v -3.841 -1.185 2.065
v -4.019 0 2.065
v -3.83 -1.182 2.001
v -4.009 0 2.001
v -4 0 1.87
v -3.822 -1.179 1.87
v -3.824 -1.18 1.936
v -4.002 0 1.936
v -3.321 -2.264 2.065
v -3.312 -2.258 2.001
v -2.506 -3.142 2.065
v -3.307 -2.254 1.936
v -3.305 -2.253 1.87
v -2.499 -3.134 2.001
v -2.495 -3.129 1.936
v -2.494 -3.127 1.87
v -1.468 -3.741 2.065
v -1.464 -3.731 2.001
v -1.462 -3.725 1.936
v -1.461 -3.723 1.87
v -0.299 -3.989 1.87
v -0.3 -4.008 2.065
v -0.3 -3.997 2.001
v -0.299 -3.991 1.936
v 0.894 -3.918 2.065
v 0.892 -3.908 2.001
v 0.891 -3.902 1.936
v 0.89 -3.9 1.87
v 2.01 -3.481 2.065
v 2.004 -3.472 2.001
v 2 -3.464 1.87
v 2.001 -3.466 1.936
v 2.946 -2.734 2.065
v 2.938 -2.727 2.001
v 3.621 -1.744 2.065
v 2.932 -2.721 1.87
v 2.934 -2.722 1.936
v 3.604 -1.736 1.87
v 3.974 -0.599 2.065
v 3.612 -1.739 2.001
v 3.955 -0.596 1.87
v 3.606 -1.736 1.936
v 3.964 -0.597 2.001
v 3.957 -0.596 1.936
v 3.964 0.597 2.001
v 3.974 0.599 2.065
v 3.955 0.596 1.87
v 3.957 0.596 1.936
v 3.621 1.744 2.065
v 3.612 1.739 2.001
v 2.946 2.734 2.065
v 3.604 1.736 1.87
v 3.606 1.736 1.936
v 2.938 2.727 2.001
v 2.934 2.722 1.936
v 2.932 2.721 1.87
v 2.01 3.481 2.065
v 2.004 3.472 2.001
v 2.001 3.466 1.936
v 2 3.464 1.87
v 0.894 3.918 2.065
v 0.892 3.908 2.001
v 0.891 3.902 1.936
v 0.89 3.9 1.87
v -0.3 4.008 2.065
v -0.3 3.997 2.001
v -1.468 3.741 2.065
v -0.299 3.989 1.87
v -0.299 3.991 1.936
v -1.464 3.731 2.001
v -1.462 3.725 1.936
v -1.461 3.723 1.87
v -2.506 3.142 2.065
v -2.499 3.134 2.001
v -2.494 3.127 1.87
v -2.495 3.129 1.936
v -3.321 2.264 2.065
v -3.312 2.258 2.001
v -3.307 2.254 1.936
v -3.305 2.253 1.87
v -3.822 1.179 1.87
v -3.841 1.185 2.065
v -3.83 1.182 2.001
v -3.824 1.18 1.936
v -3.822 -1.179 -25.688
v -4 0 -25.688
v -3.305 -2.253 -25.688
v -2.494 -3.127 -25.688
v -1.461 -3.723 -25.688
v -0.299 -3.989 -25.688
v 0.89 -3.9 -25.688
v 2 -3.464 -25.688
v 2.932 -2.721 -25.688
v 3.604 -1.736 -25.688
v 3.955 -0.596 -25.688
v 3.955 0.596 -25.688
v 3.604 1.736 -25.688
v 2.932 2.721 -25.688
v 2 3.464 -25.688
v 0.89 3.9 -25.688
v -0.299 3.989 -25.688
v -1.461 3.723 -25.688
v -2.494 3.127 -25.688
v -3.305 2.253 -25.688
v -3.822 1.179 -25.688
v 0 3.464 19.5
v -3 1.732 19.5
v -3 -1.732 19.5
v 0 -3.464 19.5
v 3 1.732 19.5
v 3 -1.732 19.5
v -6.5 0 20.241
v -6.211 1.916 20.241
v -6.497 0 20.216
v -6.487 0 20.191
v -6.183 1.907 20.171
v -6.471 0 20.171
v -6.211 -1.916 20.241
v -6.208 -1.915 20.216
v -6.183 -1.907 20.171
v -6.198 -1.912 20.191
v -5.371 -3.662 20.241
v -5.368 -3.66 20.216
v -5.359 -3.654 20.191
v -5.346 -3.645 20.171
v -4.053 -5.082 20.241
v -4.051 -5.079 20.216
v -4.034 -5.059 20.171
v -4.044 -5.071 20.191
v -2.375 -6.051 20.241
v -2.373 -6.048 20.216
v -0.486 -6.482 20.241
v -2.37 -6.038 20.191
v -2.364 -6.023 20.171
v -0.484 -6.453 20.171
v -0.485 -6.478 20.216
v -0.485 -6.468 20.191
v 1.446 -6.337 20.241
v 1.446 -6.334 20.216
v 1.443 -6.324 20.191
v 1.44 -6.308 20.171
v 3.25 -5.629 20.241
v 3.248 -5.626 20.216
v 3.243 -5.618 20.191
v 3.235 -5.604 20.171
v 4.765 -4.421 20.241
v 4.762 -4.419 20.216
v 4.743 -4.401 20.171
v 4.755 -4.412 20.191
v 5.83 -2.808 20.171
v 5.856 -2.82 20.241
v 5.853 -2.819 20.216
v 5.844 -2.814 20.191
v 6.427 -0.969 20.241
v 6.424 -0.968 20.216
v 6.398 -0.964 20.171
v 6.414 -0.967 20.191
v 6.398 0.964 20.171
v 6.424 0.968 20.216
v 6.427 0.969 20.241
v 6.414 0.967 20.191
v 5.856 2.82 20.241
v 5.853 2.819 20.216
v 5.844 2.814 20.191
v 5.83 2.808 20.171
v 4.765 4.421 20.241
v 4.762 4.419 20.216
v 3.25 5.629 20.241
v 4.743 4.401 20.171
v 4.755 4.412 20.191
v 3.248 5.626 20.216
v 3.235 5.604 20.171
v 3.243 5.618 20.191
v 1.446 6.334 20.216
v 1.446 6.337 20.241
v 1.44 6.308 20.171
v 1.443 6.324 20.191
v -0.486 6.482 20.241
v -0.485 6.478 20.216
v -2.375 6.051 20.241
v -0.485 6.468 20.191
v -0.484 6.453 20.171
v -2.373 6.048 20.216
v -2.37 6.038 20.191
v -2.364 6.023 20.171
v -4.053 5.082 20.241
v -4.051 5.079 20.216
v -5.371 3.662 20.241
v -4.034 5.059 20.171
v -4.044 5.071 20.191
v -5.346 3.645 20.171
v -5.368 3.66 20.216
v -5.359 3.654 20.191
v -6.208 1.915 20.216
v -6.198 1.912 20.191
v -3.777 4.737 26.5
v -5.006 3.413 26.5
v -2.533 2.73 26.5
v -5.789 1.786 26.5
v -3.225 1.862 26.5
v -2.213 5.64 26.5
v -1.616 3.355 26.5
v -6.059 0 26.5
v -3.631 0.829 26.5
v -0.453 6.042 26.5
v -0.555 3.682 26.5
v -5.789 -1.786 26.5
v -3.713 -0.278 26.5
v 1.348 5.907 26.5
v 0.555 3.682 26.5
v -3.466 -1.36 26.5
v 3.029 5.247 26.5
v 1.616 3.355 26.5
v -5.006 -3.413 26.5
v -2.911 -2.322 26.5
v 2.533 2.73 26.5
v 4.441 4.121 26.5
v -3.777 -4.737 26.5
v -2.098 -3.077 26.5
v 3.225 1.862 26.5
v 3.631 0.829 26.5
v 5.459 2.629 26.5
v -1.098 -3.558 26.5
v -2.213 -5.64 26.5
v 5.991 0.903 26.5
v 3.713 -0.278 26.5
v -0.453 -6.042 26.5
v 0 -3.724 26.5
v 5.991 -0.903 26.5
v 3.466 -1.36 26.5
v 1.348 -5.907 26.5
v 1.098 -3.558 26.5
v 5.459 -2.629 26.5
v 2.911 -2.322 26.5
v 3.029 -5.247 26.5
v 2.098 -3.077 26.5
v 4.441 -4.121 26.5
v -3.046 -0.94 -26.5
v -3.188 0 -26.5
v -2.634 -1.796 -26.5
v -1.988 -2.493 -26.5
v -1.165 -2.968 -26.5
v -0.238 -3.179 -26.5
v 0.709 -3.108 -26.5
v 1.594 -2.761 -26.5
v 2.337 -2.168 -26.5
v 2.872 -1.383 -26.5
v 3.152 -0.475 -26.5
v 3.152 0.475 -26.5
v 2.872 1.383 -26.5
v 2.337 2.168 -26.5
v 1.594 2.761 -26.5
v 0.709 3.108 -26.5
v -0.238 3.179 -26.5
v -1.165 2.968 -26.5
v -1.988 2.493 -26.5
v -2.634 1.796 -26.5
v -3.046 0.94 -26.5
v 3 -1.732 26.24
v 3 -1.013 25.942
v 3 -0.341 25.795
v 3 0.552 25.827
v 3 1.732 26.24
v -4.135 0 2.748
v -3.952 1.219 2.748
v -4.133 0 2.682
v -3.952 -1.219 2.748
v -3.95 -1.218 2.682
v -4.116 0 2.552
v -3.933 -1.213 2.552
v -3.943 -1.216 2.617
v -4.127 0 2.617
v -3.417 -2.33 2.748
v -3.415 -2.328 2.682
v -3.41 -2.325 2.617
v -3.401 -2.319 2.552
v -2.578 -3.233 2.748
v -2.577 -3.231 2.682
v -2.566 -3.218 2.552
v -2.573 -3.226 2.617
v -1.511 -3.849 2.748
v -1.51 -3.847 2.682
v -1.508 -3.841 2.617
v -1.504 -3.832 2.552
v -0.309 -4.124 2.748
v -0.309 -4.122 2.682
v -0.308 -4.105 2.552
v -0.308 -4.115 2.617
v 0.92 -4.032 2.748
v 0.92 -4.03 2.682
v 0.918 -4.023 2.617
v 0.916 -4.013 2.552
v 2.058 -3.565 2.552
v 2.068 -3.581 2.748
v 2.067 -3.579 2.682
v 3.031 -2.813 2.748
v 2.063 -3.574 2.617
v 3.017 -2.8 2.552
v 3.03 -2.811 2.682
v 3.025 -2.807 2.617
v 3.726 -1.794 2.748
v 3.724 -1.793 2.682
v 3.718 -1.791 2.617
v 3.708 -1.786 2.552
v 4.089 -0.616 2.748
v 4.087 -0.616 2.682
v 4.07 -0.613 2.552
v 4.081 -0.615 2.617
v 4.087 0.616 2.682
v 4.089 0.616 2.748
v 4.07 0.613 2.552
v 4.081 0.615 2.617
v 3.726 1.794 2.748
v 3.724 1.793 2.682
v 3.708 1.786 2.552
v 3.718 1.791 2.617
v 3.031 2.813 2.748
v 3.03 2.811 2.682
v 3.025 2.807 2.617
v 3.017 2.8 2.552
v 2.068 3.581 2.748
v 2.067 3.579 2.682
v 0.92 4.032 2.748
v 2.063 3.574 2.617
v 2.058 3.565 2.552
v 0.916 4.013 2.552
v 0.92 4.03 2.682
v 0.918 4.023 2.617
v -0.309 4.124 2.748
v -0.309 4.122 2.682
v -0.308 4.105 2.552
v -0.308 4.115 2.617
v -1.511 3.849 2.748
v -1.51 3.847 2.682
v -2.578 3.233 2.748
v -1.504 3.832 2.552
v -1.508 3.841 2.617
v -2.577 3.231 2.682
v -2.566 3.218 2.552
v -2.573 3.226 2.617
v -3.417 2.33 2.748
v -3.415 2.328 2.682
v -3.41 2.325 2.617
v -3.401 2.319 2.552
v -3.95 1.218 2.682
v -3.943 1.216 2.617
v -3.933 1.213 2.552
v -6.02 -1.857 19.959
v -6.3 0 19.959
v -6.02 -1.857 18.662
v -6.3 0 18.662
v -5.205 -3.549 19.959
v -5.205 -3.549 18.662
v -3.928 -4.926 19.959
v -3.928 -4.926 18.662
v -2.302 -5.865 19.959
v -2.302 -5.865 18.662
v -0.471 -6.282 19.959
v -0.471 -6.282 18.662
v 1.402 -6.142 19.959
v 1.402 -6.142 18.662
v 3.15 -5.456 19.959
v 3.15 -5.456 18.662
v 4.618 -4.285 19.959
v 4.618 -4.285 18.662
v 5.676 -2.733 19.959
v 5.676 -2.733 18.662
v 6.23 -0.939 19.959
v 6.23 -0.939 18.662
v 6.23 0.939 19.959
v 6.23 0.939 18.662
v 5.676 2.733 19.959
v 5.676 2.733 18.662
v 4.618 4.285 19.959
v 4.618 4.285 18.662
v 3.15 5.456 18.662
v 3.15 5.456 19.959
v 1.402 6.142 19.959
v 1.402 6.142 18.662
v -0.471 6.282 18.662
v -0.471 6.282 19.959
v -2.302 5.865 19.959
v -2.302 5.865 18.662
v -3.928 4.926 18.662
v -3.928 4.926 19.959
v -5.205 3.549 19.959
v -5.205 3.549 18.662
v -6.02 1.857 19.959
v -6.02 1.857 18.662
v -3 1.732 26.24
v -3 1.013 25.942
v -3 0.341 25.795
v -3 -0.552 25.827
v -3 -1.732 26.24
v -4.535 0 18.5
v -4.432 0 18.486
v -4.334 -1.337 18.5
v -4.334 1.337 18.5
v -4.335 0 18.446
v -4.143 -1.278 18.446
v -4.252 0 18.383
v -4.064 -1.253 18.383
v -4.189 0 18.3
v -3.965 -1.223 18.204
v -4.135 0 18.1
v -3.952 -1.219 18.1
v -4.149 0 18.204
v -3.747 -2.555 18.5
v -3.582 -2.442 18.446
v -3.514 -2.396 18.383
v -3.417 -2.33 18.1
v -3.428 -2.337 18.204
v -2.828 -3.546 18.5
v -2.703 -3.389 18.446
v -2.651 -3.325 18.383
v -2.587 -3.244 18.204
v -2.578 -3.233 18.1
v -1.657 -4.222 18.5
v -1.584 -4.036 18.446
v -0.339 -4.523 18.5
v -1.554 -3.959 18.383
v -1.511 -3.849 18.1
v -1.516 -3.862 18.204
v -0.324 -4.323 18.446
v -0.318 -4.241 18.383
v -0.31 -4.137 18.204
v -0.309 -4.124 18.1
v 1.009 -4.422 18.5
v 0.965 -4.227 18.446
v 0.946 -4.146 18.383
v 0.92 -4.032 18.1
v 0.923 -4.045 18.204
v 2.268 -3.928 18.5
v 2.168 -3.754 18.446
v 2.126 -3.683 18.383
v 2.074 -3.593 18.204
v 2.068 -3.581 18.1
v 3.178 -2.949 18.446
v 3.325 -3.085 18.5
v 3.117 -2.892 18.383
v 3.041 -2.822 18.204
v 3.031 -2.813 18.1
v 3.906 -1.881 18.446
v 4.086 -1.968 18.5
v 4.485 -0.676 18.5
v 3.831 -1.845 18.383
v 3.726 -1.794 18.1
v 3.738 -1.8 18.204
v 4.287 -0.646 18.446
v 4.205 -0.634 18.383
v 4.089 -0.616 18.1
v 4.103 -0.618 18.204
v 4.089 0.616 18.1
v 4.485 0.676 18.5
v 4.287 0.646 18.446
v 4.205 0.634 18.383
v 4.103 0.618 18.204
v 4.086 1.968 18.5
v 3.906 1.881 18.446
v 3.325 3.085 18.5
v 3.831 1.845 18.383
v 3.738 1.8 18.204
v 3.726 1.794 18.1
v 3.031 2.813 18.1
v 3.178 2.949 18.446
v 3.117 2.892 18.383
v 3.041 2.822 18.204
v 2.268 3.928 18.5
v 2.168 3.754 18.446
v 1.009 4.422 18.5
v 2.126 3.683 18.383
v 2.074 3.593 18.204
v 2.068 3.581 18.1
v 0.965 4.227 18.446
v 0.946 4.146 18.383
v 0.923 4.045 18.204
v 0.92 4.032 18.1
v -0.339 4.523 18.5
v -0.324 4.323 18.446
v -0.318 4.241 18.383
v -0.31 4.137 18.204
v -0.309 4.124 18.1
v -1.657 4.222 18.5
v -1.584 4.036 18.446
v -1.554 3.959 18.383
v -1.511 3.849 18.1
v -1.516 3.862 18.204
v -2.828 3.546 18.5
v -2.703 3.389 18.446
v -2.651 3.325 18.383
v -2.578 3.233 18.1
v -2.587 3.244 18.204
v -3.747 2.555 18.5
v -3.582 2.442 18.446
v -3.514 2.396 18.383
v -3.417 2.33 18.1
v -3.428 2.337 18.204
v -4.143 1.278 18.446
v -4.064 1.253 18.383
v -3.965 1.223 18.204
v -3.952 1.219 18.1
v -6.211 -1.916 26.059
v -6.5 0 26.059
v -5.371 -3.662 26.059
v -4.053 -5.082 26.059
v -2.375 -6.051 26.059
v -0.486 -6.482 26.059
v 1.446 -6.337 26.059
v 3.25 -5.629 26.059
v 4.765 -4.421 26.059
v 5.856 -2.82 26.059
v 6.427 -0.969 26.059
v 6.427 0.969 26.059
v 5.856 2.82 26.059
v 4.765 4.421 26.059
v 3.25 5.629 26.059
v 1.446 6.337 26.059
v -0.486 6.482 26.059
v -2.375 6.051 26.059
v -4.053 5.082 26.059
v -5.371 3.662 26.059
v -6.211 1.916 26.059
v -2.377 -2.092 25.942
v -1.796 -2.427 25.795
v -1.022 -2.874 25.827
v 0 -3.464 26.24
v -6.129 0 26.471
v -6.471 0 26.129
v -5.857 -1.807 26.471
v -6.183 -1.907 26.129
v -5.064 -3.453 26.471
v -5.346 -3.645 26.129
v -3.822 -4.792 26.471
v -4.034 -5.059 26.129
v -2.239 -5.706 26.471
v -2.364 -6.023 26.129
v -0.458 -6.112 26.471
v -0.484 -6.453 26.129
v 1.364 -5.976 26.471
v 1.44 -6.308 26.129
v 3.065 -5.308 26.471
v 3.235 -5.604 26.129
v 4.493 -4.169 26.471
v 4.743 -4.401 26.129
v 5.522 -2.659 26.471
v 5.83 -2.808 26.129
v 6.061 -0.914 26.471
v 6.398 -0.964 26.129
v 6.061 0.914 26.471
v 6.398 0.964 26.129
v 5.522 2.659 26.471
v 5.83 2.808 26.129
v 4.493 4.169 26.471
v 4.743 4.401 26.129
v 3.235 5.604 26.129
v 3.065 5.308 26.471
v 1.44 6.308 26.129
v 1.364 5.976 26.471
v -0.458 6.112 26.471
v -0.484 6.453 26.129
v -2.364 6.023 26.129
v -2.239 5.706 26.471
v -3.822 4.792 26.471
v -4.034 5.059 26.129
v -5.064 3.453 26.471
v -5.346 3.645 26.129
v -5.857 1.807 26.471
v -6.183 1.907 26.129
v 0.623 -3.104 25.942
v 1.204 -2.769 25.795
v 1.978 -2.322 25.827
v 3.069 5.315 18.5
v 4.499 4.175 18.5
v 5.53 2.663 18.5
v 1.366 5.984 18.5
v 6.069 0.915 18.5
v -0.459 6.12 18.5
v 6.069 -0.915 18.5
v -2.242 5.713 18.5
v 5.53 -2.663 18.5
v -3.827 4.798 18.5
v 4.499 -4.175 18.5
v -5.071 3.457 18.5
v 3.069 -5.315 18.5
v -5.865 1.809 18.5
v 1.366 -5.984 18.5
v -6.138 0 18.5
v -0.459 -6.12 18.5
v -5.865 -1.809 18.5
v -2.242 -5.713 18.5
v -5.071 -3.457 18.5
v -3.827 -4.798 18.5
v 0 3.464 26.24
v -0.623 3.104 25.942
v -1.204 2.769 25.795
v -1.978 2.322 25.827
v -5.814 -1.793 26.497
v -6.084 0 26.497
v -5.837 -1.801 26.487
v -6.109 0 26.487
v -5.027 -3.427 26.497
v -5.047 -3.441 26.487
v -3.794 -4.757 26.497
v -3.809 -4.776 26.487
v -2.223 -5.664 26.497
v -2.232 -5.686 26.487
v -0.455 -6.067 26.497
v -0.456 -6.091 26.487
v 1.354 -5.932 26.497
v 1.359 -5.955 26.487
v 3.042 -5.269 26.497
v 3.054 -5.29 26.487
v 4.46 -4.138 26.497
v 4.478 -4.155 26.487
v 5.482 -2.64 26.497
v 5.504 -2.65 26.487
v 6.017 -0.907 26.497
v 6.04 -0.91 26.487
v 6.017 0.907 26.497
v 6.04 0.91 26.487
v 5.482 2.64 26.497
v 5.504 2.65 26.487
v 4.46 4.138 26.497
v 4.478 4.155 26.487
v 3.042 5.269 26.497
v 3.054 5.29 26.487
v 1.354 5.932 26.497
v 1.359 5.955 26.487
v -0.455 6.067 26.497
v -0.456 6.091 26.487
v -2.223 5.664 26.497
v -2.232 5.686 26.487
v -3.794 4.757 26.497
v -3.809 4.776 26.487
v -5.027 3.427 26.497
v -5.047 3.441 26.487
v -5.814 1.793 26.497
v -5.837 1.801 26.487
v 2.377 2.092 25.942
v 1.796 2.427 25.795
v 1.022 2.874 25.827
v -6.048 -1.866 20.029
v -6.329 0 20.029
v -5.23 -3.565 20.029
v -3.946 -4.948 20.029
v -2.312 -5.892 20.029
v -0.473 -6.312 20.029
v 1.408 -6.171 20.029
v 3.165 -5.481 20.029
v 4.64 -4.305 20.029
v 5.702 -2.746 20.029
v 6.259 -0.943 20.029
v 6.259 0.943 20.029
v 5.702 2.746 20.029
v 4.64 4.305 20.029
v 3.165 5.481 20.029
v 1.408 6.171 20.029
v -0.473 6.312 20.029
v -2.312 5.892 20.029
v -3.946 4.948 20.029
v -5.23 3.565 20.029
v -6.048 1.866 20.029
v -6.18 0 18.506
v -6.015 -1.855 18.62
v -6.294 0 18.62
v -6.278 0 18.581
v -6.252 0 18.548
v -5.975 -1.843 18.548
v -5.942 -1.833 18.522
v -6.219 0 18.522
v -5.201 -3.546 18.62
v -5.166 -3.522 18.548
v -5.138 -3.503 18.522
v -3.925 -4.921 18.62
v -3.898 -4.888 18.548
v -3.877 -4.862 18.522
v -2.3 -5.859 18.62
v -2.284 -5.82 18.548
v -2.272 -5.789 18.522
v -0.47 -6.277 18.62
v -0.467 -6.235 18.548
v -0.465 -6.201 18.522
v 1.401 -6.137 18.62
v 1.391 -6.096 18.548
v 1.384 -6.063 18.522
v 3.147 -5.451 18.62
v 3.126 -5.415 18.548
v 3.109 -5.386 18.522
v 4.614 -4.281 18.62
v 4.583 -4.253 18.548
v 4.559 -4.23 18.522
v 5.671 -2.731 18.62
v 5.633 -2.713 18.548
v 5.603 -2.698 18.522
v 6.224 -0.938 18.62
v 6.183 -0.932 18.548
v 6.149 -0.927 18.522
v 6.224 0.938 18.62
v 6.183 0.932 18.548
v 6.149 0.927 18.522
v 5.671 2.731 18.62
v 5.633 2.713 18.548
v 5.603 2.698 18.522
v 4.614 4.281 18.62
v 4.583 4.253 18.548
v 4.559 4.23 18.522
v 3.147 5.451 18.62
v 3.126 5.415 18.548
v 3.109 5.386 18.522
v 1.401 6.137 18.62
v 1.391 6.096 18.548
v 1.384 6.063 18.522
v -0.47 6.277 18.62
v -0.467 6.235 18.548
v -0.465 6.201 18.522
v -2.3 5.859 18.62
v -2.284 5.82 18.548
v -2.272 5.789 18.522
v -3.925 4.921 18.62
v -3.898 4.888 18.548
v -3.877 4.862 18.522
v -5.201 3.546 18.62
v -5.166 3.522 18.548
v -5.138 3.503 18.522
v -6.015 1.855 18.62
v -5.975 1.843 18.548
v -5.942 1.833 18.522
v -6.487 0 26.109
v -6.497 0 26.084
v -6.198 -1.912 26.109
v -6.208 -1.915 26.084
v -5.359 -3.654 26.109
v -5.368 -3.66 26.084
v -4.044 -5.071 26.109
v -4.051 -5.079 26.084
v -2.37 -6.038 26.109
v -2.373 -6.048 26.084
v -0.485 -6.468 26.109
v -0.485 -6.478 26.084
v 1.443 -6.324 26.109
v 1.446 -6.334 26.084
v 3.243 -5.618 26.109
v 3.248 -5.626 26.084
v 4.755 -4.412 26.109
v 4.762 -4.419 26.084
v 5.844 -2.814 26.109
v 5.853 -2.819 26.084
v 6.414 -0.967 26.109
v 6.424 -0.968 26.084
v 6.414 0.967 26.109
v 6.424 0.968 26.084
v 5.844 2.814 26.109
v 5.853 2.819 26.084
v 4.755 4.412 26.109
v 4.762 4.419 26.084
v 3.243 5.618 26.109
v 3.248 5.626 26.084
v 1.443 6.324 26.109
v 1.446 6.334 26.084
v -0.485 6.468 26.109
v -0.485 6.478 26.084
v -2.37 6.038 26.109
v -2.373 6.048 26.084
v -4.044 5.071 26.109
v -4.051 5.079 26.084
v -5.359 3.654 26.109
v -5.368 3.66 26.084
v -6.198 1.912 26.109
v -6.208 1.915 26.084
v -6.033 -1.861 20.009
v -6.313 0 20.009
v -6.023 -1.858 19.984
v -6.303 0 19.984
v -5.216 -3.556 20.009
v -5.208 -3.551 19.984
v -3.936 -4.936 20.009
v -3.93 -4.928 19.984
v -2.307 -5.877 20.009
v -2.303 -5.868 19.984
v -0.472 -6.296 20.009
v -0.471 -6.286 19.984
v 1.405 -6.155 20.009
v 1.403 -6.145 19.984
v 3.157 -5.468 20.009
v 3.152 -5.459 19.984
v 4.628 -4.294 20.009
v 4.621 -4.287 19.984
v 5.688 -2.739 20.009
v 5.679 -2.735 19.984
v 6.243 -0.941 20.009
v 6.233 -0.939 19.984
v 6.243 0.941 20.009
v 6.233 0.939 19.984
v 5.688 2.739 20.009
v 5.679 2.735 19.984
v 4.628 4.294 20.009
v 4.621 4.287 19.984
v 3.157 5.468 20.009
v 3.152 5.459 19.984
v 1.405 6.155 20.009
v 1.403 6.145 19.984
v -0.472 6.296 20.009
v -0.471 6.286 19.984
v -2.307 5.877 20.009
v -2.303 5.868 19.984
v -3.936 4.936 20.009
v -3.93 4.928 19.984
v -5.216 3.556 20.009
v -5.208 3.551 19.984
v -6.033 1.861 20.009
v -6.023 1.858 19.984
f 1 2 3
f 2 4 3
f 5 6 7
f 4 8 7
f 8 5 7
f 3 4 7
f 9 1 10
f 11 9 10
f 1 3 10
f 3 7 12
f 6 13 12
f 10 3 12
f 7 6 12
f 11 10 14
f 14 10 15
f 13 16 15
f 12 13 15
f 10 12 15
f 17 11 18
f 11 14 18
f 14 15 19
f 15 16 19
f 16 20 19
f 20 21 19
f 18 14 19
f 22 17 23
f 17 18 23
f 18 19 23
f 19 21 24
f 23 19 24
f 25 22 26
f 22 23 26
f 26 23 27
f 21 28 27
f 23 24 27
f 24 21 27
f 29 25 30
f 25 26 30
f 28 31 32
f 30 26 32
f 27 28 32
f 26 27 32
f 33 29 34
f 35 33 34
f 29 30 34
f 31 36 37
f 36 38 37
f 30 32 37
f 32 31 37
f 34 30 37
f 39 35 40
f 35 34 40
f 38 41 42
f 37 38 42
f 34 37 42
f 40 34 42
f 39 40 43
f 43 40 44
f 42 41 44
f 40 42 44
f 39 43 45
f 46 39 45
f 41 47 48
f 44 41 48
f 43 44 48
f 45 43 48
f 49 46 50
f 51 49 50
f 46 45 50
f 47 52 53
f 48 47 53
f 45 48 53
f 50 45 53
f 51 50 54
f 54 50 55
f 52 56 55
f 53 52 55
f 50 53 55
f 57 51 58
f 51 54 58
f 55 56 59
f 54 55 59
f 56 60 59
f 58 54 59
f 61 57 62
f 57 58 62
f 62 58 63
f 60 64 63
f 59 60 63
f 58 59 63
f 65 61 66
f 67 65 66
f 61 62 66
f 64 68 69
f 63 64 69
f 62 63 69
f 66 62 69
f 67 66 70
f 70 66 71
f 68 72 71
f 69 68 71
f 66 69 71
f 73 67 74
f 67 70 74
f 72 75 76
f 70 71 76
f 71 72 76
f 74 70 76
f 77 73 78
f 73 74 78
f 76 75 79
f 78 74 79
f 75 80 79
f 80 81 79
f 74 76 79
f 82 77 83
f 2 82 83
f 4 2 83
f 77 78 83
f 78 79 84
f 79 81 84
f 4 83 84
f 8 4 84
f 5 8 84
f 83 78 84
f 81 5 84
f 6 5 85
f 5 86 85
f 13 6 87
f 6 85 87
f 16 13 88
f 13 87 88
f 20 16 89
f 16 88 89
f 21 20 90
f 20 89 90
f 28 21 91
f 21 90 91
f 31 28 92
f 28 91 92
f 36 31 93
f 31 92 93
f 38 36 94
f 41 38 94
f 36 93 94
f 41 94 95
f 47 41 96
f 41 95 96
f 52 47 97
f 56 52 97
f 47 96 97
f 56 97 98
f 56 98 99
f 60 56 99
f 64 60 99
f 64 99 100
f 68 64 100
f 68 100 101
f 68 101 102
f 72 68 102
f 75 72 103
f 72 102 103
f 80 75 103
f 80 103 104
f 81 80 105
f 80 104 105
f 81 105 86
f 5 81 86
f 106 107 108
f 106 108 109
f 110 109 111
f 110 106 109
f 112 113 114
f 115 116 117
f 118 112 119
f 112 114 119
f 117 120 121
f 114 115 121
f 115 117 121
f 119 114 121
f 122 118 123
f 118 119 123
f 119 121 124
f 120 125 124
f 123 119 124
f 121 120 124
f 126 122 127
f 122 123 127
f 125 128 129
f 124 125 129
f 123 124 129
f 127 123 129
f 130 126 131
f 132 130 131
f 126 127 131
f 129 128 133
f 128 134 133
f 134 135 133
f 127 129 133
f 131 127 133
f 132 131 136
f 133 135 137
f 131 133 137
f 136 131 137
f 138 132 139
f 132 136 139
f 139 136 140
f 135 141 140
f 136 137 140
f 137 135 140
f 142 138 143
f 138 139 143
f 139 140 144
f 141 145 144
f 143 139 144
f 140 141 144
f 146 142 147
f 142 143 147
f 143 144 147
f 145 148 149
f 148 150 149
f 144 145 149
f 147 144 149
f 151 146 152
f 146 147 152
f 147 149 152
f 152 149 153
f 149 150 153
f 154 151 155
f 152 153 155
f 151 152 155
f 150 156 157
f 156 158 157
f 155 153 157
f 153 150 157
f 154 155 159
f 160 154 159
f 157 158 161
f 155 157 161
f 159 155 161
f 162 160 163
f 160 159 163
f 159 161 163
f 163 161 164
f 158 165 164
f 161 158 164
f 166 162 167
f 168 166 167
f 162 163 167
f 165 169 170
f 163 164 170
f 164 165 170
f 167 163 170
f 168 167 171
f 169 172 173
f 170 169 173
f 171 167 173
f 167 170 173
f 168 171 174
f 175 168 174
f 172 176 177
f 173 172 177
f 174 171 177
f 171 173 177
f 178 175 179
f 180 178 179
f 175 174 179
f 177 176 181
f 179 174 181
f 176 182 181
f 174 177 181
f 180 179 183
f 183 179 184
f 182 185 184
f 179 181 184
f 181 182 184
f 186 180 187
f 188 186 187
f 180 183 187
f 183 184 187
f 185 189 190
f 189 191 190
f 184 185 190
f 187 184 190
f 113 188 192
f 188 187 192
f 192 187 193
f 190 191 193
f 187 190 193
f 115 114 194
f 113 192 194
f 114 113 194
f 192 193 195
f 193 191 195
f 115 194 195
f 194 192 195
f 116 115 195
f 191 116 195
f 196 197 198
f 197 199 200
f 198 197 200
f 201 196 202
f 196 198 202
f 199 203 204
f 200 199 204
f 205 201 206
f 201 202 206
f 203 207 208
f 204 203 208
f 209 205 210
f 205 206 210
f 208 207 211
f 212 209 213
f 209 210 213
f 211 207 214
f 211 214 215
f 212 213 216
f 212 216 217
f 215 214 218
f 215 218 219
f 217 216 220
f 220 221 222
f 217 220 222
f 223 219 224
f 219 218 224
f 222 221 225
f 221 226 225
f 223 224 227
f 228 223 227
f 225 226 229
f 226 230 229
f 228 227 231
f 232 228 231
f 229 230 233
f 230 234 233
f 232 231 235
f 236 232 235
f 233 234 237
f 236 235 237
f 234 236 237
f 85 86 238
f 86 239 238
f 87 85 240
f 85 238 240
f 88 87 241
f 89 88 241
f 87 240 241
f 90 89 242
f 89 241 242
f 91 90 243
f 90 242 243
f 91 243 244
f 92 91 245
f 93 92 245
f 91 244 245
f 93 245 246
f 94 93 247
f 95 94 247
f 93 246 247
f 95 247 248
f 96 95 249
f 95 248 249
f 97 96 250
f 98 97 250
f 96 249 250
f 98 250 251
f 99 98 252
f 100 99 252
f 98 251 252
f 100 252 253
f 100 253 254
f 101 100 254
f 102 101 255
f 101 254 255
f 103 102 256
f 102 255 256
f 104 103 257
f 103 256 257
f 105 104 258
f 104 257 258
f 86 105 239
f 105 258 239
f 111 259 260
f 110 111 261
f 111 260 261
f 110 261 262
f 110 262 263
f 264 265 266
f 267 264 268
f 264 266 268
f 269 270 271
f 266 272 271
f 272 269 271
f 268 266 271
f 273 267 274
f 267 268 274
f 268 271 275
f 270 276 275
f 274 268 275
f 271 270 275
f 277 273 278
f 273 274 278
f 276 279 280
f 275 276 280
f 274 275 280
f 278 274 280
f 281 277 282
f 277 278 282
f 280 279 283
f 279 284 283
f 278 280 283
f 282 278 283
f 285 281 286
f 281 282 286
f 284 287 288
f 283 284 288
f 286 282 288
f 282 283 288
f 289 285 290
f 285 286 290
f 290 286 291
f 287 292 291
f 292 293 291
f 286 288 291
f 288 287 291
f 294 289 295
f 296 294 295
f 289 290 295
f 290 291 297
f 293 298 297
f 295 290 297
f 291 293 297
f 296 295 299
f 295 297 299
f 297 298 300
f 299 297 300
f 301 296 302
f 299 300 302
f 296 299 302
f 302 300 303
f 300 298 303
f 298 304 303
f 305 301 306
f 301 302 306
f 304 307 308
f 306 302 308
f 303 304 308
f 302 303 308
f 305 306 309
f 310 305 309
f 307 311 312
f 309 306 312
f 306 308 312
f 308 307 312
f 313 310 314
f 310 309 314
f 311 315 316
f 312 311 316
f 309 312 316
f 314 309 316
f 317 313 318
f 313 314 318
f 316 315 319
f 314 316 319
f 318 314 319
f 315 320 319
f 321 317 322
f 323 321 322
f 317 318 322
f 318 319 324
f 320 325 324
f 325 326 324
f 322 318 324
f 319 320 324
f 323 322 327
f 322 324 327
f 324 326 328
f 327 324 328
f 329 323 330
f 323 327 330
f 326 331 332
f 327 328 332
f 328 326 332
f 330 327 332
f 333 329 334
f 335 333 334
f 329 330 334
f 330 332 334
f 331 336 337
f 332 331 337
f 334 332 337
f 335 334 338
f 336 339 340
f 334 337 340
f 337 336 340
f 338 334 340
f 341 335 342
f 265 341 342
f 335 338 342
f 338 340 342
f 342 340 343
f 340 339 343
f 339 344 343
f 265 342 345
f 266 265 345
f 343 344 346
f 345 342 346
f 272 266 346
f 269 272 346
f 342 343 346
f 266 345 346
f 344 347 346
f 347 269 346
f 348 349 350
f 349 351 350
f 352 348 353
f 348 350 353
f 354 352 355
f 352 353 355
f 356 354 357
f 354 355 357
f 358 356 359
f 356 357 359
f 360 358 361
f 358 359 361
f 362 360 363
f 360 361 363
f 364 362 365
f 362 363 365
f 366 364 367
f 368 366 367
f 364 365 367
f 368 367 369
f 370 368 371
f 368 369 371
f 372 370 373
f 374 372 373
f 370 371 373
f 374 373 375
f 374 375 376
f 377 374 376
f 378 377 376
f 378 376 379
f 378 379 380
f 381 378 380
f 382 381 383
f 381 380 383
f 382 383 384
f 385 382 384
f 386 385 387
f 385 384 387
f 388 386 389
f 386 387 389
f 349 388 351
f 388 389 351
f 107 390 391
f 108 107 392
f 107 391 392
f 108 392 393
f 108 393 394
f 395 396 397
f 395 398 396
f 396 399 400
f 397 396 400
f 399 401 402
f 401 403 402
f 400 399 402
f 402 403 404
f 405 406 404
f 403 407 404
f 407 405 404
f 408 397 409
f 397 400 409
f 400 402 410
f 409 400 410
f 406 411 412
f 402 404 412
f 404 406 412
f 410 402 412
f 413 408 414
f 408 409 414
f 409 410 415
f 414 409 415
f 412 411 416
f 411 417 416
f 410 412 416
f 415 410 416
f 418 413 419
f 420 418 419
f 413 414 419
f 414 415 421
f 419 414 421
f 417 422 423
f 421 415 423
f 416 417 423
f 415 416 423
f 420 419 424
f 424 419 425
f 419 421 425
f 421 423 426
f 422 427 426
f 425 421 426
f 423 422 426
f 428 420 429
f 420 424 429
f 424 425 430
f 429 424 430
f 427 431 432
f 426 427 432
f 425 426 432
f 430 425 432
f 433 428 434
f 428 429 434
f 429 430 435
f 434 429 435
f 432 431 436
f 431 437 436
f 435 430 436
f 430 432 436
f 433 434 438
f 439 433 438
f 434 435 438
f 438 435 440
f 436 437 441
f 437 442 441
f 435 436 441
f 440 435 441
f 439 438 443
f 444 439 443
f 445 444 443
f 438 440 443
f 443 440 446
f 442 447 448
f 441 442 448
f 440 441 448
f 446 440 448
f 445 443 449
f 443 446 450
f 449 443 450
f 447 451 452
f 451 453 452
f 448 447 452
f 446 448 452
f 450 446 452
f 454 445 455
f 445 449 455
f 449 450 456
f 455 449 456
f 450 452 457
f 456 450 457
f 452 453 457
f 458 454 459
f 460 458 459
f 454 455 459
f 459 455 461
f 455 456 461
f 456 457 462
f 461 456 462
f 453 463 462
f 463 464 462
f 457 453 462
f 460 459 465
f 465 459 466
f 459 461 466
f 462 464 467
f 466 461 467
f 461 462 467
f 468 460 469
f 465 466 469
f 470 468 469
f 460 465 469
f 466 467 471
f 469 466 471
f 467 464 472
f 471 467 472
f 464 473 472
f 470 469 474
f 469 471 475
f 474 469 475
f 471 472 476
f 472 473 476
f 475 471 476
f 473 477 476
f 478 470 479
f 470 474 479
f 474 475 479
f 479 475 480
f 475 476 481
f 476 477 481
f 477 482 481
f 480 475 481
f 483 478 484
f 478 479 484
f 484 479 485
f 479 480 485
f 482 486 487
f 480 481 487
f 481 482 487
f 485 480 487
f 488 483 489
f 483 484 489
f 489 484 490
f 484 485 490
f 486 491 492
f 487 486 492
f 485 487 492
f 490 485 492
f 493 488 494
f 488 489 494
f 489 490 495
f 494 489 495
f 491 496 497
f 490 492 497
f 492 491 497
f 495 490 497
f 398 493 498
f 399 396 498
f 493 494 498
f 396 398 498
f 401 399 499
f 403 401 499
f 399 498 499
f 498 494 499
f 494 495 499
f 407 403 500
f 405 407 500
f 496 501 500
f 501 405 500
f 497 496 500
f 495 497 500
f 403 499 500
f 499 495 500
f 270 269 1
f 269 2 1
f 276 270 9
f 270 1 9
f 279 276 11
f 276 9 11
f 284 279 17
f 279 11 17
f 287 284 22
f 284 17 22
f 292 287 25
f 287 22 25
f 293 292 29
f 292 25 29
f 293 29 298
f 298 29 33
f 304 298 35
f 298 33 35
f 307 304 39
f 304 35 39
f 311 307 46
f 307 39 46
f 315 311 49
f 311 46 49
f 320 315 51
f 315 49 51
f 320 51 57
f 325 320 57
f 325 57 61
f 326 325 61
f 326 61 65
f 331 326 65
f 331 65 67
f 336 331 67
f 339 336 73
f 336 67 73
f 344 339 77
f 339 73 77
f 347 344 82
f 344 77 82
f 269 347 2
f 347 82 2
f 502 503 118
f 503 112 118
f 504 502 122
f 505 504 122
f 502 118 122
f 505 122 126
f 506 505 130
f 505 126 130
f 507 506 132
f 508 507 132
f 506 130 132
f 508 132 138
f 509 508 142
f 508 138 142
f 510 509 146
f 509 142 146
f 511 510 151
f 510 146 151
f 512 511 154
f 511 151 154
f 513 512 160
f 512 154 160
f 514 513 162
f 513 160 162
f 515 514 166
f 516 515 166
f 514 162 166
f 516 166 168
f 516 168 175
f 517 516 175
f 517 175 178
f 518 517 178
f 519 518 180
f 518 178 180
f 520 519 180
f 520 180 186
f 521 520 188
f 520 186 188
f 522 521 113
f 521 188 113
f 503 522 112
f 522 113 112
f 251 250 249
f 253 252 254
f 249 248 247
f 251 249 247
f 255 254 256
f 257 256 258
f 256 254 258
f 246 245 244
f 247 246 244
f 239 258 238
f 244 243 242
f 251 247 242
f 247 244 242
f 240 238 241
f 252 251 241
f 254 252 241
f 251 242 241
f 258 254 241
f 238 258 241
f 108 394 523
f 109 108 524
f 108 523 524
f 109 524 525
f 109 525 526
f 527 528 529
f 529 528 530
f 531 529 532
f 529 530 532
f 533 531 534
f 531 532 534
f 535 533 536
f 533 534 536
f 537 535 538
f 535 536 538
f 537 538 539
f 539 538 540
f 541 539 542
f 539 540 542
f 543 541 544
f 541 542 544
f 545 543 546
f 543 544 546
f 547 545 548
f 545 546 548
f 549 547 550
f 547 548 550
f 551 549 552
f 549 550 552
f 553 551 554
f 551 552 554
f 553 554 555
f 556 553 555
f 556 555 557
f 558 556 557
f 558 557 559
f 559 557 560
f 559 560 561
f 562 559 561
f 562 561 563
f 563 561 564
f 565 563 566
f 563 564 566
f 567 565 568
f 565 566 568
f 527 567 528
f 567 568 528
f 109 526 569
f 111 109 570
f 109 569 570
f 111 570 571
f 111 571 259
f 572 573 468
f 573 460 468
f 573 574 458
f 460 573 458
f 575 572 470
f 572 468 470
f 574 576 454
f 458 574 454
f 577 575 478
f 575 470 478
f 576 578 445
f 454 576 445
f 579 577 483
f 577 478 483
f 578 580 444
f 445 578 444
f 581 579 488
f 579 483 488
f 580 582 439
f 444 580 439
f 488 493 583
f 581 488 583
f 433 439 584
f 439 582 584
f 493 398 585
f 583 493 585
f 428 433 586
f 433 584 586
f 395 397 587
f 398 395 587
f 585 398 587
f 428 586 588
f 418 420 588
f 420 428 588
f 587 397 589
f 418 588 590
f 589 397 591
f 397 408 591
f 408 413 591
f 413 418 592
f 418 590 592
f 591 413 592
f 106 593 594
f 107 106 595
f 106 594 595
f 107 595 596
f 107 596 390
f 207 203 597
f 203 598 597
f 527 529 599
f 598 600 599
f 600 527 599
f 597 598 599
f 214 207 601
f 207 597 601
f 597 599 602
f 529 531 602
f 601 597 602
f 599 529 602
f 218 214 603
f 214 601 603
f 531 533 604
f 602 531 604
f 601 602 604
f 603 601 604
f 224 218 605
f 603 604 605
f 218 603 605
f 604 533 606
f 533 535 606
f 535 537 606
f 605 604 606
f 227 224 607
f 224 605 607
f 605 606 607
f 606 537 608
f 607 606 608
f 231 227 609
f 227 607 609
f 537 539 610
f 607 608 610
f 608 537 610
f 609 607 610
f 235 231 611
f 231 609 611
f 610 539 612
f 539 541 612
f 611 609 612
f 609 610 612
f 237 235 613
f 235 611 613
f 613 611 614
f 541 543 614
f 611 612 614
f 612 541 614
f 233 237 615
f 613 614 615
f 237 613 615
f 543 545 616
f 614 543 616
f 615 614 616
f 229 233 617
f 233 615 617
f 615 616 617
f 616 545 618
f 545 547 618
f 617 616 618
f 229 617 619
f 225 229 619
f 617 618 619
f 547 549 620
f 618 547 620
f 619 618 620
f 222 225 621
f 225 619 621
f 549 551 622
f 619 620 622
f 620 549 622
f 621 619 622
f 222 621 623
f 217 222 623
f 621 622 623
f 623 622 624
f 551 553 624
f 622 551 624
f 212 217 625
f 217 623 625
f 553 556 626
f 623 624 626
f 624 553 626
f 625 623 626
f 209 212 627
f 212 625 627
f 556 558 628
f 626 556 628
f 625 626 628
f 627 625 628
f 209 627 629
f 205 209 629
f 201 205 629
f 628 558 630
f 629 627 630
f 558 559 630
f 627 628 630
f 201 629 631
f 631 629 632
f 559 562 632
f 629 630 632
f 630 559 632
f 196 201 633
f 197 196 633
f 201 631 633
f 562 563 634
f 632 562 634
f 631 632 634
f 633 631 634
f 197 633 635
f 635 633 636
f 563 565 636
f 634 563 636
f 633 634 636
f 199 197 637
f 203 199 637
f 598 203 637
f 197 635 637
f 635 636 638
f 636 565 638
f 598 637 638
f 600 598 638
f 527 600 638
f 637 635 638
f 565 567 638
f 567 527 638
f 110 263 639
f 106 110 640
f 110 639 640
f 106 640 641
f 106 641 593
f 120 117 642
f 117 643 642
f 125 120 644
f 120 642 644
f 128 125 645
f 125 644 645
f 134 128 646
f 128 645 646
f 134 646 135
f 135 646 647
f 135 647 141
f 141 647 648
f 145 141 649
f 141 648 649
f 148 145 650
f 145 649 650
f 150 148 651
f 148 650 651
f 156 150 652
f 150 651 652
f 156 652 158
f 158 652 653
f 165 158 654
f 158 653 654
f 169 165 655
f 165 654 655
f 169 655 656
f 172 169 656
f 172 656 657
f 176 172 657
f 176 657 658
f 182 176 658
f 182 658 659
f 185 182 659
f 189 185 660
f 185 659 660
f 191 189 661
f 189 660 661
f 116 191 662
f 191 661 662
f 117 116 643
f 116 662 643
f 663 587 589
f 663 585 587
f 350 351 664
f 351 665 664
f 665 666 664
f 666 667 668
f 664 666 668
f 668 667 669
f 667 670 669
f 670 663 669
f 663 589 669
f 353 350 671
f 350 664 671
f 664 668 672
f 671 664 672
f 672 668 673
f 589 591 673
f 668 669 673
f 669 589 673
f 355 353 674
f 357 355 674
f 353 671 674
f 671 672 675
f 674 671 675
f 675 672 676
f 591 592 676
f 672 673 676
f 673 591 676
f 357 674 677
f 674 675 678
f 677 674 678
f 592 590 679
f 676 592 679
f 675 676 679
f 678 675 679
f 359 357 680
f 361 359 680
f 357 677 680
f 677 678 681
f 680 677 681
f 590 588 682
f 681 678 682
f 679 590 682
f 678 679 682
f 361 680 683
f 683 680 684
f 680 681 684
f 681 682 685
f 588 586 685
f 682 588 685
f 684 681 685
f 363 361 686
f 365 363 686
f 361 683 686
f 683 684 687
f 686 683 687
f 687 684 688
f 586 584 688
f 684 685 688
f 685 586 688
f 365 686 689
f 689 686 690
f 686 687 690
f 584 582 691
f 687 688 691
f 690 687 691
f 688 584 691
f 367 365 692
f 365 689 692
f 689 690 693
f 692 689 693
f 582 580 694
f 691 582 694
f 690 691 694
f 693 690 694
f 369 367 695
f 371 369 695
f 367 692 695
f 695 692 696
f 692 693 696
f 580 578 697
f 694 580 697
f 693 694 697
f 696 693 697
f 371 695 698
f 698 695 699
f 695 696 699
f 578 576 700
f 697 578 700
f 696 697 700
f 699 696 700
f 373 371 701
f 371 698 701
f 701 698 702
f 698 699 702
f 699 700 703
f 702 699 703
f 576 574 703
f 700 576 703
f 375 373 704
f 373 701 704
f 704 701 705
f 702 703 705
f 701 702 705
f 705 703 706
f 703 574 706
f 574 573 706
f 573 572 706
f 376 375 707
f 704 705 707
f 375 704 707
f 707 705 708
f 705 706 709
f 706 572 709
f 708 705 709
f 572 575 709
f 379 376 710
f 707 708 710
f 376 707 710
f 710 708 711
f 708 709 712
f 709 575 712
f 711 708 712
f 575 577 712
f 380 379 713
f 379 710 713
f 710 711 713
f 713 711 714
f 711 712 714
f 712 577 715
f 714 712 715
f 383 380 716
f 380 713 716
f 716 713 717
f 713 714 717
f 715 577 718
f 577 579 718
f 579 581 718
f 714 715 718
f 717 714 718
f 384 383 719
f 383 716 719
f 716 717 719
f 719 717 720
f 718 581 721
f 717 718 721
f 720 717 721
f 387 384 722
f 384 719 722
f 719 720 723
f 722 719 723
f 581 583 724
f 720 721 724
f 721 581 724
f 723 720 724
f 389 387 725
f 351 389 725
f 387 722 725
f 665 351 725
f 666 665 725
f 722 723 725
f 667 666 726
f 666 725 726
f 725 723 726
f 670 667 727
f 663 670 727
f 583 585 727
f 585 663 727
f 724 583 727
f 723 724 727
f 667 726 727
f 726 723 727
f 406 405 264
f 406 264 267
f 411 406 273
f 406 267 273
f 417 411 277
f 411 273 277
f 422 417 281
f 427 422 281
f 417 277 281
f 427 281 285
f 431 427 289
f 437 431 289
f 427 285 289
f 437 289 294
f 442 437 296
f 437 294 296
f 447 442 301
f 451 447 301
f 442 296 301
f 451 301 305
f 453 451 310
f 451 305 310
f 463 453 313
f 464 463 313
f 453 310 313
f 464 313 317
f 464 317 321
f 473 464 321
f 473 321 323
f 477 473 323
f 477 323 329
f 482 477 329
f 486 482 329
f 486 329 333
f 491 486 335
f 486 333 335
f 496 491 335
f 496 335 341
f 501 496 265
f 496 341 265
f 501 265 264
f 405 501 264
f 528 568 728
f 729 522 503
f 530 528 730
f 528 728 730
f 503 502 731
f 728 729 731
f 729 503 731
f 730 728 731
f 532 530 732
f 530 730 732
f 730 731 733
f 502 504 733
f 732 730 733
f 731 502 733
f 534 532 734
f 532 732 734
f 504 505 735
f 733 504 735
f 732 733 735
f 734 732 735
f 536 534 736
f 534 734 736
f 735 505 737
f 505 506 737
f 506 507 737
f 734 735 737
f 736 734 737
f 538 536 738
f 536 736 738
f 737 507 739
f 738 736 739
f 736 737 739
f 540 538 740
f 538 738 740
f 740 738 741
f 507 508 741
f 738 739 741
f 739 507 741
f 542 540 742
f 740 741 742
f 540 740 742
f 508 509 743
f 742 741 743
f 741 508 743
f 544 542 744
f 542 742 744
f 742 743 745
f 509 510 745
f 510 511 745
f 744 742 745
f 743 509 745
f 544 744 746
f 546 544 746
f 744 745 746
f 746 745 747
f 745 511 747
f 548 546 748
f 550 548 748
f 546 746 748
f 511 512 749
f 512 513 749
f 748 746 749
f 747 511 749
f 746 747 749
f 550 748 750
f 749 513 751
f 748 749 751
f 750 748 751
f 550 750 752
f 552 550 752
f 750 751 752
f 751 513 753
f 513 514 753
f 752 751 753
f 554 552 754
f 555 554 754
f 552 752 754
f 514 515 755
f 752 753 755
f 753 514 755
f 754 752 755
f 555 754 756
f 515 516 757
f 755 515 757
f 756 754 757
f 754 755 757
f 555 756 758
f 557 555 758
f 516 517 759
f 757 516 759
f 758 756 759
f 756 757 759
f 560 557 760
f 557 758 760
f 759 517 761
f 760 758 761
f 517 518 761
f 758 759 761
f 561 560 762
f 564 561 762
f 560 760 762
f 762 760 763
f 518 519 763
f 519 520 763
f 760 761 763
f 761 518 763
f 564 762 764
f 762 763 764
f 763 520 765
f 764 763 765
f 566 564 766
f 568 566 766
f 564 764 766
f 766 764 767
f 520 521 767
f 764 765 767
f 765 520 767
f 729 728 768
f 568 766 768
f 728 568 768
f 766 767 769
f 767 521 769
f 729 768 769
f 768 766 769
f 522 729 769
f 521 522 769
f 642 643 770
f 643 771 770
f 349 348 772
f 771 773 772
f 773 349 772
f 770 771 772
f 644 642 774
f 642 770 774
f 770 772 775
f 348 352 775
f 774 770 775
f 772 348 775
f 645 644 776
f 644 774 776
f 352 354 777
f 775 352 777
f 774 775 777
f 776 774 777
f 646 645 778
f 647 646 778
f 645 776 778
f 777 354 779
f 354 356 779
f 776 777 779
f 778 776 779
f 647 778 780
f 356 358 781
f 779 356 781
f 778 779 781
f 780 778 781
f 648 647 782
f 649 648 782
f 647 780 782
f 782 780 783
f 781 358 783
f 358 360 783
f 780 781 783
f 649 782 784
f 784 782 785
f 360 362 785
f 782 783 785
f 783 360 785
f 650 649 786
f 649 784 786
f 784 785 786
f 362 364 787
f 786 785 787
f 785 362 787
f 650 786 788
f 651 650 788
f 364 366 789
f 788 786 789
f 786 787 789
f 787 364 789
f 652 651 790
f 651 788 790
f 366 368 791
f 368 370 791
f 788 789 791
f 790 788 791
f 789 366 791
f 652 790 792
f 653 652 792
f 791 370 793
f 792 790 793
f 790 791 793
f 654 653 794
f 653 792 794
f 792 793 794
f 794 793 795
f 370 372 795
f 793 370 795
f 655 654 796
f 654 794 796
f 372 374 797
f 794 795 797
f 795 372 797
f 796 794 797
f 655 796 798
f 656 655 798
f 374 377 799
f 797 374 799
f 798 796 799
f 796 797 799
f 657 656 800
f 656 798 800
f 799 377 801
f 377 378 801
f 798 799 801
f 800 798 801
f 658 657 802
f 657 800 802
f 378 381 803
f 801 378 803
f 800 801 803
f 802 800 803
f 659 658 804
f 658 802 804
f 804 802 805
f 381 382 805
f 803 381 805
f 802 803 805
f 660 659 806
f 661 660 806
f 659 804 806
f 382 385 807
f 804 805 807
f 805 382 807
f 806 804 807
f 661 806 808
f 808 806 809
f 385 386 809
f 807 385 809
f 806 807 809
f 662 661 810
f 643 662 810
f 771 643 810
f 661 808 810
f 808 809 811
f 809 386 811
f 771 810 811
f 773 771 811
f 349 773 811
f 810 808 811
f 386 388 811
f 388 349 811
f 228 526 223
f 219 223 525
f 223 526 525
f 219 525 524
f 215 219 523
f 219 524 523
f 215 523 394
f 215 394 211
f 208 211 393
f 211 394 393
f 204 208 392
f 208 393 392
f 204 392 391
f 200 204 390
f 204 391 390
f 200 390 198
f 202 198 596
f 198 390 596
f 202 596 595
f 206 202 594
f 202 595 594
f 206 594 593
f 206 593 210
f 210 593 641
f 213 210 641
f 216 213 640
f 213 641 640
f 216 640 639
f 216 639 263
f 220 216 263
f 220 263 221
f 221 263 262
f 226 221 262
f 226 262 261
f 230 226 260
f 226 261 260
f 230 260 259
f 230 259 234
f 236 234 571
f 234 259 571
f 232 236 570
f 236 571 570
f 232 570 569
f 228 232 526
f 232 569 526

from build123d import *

# Parameters (mm, degrees)
CUT_EXTRUDE1_DEPTH = 7


with BuildPart() as part:
    # Sketch2 → Revolve1 (revolve)
    with BuildSketch(Plane(origin=(0, 0, 0), x_dir=(0, 0, -1), z_dir=(1, 0, 0)), mode=Mode.PRIVATE) as revolve1_sk:
        with BuildLine():
            Line((-26.5, 0), (-26.5, 6.058578644))
            ThreePointArc((-26.5, 6.058578644), (-26.492387953, 6.096846987), (-26.470710678, 6.129289322))
            Line((-26.470710678, 6.129289322), (-26.129289322, 6.470710678))
            ThreePointArc((-26.129289322, 6.470710678), (-26.096846987, 6.492387953), (-26.058578644, 6.5))
            Line((-26.058578644, 6.5), (-20.241421356, 6.5))
            ThreePointArc((-20.241421356, 6.5), (-20.203153013, 6.492387953), (-20.170710678, 6.470710678))
            Line((-20.170710678, 6.470710678), (-20.029289322, 6.329289322))
            ThreePointArc((-20.029289322, 6.329289322), (-19.996846987, 6.307612047), (-19.958578644, 6.3))
            Line((-19.958578644, 6.3), (-18.6625, 6.3))
            ThreePointArc((-18.6625, 6.3), (-18.547595148, 6.252404852), (-18.5, 6.1375))
            Line((-18.5, 6.1375), (-18.5, 4.535316469))
            ThreePointArc((-18.5, 4.535316469), (-18.382842712, 4.252473757), (-18.1, 4.135316469))
            Line((-18.1, 4.135316469), (-2.747523234, 4.135316469))
            ThreePointArc((-2.747523234, 4.135316469), (-2.649506093, 4.130501196), (-2.552432912, 4.11610175))
            Line((-2.552432912, 4.11610175), (-2.065348919, 4.01921472))
            ThreePointArc((-2.065348919, 4.01921472), (-1.968275737, 4.004815273), (-1.870258597, 4))
            Line((-1.870258597, 4), (25.688101184, 4))
            Line((25.688101184, 4), (26.5, 3.188101184))
            Line((26.5, 3.188101184), (26.5, 0))
            Line((26.5, 0), (-26.5, 0))
        make_face()
    revolve(revolve1_sk.sketch.rotate(Axis((0, 0, -26.5), (0, 0, 1)), 90), axis=Axis((0, 0, -26.5), (0, 0, 1)))

    # Sketch3 → Cut-Extrude1 (cut)
    with BuildSketch(Plane.XY.offset(26.5)):
        Polygon((3, -1.732050808), (3, 1.732050808), (0, 3.464101615), (-3, 1.732050808), (-3, -1.732050808), (0, -3.464101615), align=None)
    extrude(amount=-CUT_EXTRUDE1_DEPTH, mode=Mode.SUBTRACT)

    # Cut-Extrude2 cone 1 section (through the dimple's axis) → Cut-Extrude2 (revolve, cut)
    with BuildSketch(Plane(origin=(0, 0, 26.5), x_dir=(0, -1, 0), z_dir=(1, 0, 0))):
        Polygon((0, 0), (3.723909236, 0), (0, 3.723909236), align=None)
    revolve(axis=Axis((0, 0, 26.5), (0, 0, -1)), mode=Mode.SUBTRACT)


solid = part.part
